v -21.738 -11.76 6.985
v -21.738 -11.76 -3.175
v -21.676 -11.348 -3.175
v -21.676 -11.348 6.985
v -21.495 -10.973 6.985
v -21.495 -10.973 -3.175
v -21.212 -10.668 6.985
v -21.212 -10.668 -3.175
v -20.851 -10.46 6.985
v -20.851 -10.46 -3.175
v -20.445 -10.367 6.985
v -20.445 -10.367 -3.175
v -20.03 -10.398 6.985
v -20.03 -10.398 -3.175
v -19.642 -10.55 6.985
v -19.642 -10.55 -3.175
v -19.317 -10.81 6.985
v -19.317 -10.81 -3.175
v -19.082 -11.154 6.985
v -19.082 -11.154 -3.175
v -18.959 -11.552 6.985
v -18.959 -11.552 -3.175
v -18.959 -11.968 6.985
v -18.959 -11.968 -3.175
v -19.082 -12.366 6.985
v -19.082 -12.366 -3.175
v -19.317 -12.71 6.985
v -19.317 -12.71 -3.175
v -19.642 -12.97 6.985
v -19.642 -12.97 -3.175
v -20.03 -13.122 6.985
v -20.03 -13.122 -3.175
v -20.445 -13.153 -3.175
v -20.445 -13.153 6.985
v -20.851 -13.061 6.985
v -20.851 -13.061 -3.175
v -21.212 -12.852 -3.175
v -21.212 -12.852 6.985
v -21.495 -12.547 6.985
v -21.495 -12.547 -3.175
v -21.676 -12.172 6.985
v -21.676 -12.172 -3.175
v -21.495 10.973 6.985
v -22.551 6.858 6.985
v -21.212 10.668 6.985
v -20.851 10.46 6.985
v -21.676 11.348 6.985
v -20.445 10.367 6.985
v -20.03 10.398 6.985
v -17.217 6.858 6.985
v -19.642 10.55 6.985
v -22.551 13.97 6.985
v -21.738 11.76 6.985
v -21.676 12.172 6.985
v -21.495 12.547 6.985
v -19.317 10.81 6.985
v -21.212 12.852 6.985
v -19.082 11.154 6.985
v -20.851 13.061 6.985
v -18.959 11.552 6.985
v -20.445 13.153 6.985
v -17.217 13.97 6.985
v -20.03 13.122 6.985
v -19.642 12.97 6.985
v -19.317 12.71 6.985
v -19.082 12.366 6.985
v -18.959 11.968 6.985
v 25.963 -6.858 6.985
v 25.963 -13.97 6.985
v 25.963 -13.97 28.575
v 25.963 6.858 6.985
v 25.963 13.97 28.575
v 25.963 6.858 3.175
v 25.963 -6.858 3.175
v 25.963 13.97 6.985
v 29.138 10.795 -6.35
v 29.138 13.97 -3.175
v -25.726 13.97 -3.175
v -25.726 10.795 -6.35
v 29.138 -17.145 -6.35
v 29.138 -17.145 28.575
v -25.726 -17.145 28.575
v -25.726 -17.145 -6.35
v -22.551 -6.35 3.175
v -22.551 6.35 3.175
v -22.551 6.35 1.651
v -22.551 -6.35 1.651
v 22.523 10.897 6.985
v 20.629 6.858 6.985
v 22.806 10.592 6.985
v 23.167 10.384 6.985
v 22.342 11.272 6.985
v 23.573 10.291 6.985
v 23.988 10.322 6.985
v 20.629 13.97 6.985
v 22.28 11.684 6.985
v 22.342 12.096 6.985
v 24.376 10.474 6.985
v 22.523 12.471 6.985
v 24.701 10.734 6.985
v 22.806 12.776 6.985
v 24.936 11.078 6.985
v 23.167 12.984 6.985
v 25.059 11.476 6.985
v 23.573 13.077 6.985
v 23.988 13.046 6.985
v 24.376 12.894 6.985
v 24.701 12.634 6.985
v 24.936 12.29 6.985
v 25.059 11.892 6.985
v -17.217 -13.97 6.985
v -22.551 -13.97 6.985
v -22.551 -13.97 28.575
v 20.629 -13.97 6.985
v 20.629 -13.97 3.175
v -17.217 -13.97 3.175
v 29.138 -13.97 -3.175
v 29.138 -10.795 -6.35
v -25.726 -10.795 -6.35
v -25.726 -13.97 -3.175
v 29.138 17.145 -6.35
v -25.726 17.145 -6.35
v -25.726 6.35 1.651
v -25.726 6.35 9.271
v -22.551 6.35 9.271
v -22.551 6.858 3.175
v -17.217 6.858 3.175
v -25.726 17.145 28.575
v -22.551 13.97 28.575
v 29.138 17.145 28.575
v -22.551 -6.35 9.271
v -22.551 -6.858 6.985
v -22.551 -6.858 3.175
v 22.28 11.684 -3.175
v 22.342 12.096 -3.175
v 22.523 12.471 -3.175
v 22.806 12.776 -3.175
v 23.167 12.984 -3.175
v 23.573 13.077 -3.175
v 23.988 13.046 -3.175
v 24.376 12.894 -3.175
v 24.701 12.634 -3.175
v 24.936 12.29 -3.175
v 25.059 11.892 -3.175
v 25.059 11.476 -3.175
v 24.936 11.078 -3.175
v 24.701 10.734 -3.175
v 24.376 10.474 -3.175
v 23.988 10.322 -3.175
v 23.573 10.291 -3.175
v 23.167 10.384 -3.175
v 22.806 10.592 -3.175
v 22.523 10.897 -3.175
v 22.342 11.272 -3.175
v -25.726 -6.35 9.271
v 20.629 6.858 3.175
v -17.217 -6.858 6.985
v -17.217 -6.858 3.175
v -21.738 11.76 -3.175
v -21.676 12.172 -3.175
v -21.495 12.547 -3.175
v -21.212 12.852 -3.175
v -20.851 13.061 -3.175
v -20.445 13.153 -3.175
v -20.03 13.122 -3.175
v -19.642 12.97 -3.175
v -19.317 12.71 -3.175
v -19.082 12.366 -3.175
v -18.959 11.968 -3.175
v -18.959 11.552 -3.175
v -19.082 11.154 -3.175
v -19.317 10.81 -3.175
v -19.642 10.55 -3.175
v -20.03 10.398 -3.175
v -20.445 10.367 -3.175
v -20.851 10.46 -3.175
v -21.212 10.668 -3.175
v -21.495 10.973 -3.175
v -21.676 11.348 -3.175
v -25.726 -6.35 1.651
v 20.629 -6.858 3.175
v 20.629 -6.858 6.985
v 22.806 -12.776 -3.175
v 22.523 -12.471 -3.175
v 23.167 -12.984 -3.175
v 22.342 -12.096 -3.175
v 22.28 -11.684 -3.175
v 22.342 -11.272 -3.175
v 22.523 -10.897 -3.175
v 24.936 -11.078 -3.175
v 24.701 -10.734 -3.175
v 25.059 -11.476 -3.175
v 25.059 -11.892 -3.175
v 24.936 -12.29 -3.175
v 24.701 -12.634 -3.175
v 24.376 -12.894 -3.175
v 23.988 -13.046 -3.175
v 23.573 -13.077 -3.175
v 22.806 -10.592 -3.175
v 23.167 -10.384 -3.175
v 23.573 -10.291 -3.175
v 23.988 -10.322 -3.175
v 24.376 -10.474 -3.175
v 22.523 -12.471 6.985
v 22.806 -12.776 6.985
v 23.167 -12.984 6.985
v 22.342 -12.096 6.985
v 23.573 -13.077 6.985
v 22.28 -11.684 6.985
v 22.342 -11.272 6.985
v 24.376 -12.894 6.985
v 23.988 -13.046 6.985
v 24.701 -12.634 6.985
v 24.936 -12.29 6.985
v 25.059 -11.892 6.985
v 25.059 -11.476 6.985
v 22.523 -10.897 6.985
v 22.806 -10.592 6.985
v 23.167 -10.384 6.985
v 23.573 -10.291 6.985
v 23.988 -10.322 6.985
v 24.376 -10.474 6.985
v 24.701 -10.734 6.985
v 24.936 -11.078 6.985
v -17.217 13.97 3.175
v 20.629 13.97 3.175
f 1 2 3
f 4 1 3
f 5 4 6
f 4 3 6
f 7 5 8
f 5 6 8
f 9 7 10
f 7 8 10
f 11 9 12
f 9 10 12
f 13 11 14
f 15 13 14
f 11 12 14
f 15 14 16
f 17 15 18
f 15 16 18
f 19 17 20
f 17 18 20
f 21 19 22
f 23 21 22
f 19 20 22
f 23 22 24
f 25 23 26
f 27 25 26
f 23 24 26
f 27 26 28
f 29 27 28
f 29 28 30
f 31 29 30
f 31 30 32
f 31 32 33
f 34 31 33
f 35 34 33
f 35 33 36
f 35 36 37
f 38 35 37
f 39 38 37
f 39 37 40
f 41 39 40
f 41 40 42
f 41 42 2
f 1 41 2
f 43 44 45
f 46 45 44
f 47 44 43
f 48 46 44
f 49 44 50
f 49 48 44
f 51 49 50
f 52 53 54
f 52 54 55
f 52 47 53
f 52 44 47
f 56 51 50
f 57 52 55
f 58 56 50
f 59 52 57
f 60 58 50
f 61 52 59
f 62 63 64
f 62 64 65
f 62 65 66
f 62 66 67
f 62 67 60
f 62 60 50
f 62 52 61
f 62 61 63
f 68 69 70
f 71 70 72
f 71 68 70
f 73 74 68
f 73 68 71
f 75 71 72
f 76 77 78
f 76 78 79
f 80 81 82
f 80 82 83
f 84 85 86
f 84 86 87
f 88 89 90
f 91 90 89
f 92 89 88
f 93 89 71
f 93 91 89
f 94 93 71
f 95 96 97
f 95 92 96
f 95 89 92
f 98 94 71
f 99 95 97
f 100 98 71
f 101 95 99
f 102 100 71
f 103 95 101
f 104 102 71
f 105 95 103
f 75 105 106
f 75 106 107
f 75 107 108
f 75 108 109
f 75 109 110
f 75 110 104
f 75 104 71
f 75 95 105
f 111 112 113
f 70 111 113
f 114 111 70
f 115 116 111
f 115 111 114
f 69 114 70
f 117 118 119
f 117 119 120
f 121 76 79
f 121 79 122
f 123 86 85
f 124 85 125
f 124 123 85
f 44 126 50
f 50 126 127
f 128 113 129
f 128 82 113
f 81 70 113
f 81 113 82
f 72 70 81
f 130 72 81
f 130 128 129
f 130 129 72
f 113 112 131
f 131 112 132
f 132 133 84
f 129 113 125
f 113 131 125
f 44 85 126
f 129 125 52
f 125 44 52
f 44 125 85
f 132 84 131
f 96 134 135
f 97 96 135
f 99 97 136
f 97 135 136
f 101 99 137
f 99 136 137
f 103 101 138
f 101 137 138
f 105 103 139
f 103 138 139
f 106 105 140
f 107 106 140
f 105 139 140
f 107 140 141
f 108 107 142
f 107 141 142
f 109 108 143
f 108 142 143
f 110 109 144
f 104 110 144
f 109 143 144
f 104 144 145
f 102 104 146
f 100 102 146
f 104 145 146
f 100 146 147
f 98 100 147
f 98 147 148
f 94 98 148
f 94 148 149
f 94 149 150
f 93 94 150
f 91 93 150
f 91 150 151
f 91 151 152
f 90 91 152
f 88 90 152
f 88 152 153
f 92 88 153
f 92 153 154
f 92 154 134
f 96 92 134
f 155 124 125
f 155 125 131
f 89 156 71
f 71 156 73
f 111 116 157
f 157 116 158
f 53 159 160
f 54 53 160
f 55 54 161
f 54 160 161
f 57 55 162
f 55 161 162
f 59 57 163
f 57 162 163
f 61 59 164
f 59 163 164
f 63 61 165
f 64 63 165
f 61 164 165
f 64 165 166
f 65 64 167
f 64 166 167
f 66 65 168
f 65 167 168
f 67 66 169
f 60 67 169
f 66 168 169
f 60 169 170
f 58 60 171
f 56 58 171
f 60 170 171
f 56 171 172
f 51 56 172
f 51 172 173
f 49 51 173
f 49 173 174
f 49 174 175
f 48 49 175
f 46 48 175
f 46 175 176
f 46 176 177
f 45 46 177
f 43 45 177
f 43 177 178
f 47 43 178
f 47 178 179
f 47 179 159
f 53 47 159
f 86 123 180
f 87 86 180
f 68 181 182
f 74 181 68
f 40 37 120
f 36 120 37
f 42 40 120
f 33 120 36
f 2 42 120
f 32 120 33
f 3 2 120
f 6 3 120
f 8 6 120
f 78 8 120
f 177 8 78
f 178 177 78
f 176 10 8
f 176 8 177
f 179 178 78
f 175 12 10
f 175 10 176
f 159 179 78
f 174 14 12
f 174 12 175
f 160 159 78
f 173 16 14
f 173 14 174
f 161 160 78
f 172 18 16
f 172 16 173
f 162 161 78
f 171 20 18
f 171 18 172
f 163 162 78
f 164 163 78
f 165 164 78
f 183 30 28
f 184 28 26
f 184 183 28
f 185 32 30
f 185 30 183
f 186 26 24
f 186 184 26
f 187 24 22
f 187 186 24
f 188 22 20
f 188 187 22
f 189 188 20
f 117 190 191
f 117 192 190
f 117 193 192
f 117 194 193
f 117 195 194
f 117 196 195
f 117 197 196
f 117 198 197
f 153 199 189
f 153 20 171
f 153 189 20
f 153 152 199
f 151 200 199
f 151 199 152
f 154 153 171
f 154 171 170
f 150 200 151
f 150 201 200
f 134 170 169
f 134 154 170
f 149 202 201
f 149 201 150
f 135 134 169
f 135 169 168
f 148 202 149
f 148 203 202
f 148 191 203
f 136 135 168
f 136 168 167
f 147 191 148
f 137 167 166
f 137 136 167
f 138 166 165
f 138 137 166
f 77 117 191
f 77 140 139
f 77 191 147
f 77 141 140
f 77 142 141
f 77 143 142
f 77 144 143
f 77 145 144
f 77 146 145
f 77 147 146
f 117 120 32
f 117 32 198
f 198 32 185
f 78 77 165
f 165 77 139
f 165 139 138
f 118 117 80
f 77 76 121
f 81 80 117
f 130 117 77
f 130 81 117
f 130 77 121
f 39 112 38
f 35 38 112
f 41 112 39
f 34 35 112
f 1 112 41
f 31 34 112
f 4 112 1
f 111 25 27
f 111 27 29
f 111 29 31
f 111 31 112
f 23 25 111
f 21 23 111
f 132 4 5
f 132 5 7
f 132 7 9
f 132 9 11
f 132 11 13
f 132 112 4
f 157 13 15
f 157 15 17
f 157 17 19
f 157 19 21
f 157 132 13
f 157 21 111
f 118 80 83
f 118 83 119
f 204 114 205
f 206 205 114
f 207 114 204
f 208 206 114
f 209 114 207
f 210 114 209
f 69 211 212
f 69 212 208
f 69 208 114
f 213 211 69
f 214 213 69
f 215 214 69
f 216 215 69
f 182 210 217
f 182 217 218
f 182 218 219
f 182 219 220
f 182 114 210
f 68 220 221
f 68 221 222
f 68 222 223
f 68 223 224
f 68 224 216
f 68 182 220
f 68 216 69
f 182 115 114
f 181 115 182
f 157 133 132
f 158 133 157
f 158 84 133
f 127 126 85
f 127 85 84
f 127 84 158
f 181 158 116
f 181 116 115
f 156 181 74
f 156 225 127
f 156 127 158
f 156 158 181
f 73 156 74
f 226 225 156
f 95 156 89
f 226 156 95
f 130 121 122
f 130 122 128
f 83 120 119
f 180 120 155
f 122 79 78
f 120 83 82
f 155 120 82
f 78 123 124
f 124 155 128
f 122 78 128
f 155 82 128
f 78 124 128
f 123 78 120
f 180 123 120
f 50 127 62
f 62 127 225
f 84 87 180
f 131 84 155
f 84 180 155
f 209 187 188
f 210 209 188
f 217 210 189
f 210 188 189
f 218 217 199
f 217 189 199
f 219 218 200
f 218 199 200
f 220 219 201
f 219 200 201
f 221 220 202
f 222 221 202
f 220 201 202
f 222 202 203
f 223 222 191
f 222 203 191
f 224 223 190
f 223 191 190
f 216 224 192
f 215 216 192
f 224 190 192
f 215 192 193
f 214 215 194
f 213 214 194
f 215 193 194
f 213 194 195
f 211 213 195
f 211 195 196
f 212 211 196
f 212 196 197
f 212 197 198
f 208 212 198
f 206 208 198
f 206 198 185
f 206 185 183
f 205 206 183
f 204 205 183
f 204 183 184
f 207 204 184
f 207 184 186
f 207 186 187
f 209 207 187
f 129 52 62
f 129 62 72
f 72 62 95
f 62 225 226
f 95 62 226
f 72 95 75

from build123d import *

# Parameters (mm, degrees)
F0_W      = 54.864
F0_H      = 34.29
F1_DEPTH  = 28.575
F2_T      = -3.175
F3_W      = 5.334
F3_H      = 7.112
F4_DEPTH  = 3.81
F6_DEPTH  = 54.864
F8_D      = 2.794
F8_DEPTH  = 10.16
F9_W      = 12.7
F9_H      = 7.62
F10_DEPTH = 3.175


with BuildPart() as f1:
    # F0 (on Top) → F1 (new body)
    with BuildSketch(Plane.XY):
        with Locations((1.706375, 0)):
            Rectangle(F0_W, F0_H)
    extrude(amount=F1_DEPTH)

    # F2
    f2_openings = [f1.faces().sort_by_distance(p)[0] for p in [
        (1.706375, 0, 28.575),
    ]]
    offset(amount=F2_T, openings=f2_openings)

    # F3 (on face) → F4 (join)
    with BuildSketch(Plane.XY.offset(3.175)):
        with Locations((-19.883625, 10.414)):
            Rectangle(F3_W, F3_H)
        with Locations((-19.883625, -10.414)):
            Rectangle(F3_W, F3_H)
        with Locations((23.296375, -10.414)):
            Rectangle(F3_W, F3_H)
        with Locations((23.296375, 10.414)):
            Rectangle(F3_W, F3_H)
    extrude(amount=F4_DEPTH)

    # F5 (on face) → F6 (join)
    with BuildSketch(Plane.YZ.offset(29.138375)):
        Polygon((17.145, -6.35), (17.145, 0), (-17.145, 0), (-17.145, -6.35), (-10.795, -6.35), (-13.97, -3.175), (-10.795, -3.175), (13.97, -3.175), (10.795, -6.35), align=None)
    extrude(amount=-F6_DEPTH)

    # F8
    with Locations(Plane.XY.offset(6.985)):
        with Locations((-20.340825, 11.7602), (23.677375, 11.684), (23.677375, -11.684), (-20.340825, -11.7602)):
            Hole(F8_D / 2, depth=F8_DEPTH)

    # F9 (on face) → F10 (cut)
    with BuildSketch(Plane(origin=(-25.725625, 0, 0), x_dir=(0, -1, 0), z_dir=(-1, 0, 0))):
        with Locations((0, 5.461)):
            Rectangle(F9_W, F9_H)
    extrude(amount=-F10_DEPTH, mode=Mode.SUBTRACT)


solid = f1.part
